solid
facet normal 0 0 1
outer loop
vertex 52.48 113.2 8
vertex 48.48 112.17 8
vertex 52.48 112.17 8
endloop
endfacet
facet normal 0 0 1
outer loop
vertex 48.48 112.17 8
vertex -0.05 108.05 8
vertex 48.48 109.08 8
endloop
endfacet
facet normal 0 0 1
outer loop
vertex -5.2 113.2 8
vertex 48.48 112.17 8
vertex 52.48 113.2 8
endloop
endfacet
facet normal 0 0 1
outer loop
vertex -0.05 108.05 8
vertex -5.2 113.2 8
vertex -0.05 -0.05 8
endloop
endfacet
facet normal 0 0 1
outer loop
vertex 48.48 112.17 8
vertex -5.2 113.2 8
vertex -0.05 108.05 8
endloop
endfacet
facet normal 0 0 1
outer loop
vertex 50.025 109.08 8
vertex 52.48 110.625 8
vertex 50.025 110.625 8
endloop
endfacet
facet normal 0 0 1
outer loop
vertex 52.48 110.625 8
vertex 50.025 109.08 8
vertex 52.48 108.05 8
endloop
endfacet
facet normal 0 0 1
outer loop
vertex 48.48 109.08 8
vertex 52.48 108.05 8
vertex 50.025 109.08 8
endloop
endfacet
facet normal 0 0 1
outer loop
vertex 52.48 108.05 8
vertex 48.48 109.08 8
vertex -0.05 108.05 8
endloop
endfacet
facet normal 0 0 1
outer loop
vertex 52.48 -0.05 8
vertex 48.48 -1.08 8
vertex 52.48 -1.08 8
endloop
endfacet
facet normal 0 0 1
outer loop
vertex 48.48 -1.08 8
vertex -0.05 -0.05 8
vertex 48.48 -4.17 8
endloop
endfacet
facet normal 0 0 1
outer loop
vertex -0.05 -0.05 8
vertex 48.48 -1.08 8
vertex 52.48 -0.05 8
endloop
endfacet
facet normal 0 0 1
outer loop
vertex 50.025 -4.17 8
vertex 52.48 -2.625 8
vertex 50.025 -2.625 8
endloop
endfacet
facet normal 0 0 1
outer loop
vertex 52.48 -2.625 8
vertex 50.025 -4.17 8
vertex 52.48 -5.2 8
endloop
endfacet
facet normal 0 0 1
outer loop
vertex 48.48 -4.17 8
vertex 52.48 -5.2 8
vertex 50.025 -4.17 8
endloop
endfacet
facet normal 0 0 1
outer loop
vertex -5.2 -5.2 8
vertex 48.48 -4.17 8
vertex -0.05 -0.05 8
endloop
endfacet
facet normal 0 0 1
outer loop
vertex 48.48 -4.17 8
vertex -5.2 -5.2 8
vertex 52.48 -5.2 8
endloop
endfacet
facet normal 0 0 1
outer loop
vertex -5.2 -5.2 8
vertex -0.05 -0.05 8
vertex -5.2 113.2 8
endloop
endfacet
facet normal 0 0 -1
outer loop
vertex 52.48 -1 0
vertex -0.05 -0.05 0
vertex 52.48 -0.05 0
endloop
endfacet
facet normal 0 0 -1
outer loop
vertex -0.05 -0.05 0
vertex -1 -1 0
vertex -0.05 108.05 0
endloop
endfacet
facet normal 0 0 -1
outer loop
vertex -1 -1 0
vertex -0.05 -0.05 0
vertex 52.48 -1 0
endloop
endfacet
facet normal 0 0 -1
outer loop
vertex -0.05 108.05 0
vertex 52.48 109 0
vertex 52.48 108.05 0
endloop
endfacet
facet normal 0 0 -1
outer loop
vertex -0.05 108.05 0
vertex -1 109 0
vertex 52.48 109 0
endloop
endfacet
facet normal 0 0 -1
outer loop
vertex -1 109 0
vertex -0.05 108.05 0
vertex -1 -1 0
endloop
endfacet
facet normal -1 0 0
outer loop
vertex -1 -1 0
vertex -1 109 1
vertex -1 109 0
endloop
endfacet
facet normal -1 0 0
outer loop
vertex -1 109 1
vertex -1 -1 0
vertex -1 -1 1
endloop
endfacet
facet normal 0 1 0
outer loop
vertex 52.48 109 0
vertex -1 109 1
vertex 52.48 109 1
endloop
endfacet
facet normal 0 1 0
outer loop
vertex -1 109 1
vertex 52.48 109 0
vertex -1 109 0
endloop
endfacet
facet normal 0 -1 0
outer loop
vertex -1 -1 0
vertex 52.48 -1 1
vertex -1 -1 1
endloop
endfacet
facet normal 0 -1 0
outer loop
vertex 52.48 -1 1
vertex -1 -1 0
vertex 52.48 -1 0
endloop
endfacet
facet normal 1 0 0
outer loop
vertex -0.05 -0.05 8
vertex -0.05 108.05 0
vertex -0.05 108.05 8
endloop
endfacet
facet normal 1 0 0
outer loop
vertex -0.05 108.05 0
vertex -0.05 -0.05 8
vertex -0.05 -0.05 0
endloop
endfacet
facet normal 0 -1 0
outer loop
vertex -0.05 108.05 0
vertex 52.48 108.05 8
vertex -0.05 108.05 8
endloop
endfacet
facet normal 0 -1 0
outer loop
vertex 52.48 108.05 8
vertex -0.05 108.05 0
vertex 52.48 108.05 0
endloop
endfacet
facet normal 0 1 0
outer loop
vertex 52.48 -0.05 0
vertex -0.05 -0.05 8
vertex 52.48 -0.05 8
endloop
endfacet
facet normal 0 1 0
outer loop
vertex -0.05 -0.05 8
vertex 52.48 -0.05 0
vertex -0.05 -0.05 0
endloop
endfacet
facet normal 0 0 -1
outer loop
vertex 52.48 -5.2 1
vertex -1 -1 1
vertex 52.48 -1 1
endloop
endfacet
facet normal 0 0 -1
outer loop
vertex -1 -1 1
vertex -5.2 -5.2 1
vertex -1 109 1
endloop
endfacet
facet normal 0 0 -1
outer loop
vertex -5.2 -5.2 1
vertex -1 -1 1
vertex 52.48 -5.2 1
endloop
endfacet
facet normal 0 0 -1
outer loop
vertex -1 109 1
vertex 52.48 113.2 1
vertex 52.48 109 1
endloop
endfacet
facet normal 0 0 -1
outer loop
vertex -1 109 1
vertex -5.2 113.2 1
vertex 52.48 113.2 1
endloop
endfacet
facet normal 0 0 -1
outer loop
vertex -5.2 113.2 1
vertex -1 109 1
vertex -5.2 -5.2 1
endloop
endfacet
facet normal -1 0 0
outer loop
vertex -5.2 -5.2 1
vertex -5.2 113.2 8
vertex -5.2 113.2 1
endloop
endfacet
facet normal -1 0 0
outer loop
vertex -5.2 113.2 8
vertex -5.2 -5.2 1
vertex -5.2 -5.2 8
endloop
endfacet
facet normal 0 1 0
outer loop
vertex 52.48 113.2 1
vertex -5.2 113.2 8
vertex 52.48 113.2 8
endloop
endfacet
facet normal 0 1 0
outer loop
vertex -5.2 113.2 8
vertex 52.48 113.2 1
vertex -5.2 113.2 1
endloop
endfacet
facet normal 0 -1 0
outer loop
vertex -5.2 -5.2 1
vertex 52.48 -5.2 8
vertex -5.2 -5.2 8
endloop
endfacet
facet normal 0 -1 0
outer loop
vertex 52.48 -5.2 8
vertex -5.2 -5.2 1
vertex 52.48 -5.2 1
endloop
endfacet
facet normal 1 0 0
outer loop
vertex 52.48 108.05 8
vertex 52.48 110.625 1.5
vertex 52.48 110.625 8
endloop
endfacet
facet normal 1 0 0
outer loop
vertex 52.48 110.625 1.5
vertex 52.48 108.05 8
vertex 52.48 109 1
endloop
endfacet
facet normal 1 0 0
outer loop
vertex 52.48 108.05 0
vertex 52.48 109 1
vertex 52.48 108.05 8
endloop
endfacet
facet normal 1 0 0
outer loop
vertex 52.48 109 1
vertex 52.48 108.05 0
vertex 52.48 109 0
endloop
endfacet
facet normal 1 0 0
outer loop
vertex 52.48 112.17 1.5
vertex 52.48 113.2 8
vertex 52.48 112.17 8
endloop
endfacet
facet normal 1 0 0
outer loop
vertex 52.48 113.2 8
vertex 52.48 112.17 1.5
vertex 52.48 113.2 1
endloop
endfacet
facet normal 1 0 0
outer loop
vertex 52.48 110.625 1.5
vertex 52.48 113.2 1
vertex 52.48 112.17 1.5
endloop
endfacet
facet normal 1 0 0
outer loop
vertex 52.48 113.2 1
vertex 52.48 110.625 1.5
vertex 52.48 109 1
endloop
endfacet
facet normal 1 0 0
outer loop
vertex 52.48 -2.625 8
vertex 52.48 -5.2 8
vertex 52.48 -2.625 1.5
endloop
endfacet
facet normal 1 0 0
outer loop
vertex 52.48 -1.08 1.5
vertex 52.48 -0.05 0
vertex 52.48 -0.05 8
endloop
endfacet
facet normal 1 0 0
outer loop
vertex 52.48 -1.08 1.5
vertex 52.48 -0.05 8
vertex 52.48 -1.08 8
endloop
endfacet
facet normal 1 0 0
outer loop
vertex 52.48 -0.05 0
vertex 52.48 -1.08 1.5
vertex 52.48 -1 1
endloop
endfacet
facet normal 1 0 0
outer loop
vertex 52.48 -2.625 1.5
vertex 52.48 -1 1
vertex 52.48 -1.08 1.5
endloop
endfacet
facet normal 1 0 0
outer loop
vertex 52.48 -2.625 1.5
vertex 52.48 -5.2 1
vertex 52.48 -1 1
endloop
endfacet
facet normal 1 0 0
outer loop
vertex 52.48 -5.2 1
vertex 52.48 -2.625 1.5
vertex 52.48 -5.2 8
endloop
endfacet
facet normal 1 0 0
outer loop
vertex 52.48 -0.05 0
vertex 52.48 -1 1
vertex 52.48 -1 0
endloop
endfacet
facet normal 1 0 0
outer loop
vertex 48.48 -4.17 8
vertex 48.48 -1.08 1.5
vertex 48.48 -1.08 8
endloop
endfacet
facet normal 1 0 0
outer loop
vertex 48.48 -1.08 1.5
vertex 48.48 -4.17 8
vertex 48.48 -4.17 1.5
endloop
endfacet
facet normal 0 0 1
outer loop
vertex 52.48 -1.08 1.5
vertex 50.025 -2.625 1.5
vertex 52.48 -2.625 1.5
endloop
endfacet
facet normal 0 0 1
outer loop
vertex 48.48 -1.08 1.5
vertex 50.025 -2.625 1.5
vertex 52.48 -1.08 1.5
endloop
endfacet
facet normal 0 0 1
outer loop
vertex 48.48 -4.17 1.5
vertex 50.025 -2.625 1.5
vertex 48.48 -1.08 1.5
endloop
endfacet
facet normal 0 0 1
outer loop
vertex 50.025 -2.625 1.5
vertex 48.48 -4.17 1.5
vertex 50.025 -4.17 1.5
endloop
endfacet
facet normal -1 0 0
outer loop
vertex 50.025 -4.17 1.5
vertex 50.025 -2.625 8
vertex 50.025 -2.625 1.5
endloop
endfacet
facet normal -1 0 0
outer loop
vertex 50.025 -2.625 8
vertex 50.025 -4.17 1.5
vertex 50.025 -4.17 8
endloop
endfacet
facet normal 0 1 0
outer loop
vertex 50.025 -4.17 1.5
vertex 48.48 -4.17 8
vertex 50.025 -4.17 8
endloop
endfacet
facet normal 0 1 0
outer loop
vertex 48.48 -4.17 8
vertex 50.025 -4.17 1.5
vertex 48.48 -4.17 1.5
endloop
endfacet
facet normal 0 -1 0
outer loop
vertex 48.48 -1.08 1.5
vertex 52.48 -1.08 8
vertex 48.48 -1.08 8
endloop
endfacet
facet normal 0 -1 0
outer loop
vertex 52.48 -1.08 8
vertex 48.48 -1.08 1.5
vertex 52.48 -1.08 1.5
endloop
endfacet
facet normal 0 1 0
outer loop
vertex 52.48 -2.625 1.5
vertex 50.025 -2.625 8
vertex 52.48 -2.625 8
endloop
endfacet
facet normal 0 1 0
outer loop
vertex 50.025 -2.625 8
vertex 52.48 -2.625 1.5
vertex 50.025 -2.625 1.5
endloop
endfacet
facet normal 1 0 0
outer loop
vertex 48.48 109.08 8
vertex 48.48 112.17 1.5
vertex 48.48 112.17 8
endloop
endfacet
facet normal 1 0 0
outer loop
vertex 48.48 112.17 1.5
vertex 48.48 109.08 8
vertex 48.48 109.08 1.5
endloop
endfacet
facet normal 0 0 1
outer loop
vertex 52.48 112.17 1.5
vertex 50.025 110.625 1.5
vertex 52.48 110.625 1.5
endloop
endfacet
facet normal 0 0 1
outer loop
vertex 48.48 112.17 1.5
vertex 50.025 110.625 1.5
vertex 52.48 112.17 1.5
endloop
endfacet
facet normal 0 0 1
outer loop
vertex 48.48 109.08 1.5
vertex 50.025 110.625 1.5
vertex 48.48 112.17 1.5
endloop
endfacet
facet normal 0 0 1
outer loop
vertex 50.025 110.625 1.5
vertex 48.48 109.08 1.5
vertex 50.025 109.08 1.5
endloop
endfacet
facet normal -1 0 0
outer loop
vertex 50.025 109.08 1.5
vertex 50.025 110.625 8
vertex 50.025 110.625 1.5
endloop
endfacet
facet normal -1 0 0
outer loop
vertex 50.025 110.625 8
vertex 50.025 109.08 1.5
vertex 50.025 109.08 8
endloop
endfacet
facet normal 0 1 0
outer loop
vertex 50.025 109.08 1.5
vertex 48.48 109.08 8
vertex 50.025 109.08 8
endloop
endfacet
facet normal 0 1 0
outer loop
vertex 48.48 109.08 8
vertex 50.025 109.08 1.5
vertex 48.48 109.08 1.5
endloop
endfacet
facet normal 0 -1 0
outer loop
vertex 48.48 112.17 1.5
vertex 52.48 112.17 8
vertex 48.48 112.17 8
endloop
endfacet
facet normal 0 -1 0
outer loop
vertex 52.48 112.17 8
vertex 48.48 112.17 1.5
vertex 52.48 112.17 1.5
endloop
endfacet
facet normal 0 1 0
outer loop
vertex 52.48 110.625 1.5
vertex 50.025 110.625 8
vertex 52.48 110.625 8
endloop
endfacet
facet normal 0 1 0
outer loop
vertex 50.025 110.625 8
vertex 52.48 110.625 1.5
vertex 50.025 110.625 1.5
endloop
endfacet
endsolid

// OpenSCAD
// Generated by SolidPython 1.0.4 on 2021-01-27 23:57:22


difference() {
	difference() {
		difference() {
			union() {
				difference() {
					translate(v = [-1.0000000000, -1.0000000000, 0]) {
						cube(size = [74.0000000000, 110.0000000000, 8]);
					}
					translate(v = [-0.0500000000, -0.0500000000, 0]) {
						cube(size = [72.1000000000, 108.1000000000, 8]);
					}
				}
				translate(v = [0, 0, 1]) {
					difference() {
						translate(v = [-5.2000000000, -5.2000000000, 0]) {
							cube(size = [82.4000000000, 118.4000000000, 7]);
						}
						translate(v = [-1.0000000000, -1.0000000000, 0]) {
							cube(size = [74.0000000000, 110.0000000000, 7]);
						}
					}
				}
			}
			translate(v = [52.4800000000, -5.2000000000, 0]) {
				cube(size = [24.7200000000, 118.4000000000, 8]);
			}
		}
		translate(v = [48.4800000000, -4.1700000000, 0]) {
			translate(v = [0, 0, 1.5000000000]) {
				translate(v = [4, 3.0900000000, 0]) {
					rotate(a = -180) {
						union() {
							translate(v = [2.4550000000, 0, 0]) {
								cube(size = [1.5450000000, 3.0900000000, 6.5000000000]);
							}
							cube(size = [4, 1.5450000000, 6.5000000000]);
						}
					}
				}
			}
		}
	}
	translate(v = [48.4800000000, 109.0800000000, 0]) {
		translate(v = [0, 0, 1.5000000000]) {
			translate(v = [4, 3.0900000000, 0]) {
				rotate(a = -180) {
					union() {
						translate(v = [2.4550000000, 0, 0]) {
							cube(size = [1.5450000000, 3.0900000000, 6.5000000000]);
						}
						cube(size = [4, 1.5450000000, 6.5000000000]);
					}
				}
			}
		}
	}
}
